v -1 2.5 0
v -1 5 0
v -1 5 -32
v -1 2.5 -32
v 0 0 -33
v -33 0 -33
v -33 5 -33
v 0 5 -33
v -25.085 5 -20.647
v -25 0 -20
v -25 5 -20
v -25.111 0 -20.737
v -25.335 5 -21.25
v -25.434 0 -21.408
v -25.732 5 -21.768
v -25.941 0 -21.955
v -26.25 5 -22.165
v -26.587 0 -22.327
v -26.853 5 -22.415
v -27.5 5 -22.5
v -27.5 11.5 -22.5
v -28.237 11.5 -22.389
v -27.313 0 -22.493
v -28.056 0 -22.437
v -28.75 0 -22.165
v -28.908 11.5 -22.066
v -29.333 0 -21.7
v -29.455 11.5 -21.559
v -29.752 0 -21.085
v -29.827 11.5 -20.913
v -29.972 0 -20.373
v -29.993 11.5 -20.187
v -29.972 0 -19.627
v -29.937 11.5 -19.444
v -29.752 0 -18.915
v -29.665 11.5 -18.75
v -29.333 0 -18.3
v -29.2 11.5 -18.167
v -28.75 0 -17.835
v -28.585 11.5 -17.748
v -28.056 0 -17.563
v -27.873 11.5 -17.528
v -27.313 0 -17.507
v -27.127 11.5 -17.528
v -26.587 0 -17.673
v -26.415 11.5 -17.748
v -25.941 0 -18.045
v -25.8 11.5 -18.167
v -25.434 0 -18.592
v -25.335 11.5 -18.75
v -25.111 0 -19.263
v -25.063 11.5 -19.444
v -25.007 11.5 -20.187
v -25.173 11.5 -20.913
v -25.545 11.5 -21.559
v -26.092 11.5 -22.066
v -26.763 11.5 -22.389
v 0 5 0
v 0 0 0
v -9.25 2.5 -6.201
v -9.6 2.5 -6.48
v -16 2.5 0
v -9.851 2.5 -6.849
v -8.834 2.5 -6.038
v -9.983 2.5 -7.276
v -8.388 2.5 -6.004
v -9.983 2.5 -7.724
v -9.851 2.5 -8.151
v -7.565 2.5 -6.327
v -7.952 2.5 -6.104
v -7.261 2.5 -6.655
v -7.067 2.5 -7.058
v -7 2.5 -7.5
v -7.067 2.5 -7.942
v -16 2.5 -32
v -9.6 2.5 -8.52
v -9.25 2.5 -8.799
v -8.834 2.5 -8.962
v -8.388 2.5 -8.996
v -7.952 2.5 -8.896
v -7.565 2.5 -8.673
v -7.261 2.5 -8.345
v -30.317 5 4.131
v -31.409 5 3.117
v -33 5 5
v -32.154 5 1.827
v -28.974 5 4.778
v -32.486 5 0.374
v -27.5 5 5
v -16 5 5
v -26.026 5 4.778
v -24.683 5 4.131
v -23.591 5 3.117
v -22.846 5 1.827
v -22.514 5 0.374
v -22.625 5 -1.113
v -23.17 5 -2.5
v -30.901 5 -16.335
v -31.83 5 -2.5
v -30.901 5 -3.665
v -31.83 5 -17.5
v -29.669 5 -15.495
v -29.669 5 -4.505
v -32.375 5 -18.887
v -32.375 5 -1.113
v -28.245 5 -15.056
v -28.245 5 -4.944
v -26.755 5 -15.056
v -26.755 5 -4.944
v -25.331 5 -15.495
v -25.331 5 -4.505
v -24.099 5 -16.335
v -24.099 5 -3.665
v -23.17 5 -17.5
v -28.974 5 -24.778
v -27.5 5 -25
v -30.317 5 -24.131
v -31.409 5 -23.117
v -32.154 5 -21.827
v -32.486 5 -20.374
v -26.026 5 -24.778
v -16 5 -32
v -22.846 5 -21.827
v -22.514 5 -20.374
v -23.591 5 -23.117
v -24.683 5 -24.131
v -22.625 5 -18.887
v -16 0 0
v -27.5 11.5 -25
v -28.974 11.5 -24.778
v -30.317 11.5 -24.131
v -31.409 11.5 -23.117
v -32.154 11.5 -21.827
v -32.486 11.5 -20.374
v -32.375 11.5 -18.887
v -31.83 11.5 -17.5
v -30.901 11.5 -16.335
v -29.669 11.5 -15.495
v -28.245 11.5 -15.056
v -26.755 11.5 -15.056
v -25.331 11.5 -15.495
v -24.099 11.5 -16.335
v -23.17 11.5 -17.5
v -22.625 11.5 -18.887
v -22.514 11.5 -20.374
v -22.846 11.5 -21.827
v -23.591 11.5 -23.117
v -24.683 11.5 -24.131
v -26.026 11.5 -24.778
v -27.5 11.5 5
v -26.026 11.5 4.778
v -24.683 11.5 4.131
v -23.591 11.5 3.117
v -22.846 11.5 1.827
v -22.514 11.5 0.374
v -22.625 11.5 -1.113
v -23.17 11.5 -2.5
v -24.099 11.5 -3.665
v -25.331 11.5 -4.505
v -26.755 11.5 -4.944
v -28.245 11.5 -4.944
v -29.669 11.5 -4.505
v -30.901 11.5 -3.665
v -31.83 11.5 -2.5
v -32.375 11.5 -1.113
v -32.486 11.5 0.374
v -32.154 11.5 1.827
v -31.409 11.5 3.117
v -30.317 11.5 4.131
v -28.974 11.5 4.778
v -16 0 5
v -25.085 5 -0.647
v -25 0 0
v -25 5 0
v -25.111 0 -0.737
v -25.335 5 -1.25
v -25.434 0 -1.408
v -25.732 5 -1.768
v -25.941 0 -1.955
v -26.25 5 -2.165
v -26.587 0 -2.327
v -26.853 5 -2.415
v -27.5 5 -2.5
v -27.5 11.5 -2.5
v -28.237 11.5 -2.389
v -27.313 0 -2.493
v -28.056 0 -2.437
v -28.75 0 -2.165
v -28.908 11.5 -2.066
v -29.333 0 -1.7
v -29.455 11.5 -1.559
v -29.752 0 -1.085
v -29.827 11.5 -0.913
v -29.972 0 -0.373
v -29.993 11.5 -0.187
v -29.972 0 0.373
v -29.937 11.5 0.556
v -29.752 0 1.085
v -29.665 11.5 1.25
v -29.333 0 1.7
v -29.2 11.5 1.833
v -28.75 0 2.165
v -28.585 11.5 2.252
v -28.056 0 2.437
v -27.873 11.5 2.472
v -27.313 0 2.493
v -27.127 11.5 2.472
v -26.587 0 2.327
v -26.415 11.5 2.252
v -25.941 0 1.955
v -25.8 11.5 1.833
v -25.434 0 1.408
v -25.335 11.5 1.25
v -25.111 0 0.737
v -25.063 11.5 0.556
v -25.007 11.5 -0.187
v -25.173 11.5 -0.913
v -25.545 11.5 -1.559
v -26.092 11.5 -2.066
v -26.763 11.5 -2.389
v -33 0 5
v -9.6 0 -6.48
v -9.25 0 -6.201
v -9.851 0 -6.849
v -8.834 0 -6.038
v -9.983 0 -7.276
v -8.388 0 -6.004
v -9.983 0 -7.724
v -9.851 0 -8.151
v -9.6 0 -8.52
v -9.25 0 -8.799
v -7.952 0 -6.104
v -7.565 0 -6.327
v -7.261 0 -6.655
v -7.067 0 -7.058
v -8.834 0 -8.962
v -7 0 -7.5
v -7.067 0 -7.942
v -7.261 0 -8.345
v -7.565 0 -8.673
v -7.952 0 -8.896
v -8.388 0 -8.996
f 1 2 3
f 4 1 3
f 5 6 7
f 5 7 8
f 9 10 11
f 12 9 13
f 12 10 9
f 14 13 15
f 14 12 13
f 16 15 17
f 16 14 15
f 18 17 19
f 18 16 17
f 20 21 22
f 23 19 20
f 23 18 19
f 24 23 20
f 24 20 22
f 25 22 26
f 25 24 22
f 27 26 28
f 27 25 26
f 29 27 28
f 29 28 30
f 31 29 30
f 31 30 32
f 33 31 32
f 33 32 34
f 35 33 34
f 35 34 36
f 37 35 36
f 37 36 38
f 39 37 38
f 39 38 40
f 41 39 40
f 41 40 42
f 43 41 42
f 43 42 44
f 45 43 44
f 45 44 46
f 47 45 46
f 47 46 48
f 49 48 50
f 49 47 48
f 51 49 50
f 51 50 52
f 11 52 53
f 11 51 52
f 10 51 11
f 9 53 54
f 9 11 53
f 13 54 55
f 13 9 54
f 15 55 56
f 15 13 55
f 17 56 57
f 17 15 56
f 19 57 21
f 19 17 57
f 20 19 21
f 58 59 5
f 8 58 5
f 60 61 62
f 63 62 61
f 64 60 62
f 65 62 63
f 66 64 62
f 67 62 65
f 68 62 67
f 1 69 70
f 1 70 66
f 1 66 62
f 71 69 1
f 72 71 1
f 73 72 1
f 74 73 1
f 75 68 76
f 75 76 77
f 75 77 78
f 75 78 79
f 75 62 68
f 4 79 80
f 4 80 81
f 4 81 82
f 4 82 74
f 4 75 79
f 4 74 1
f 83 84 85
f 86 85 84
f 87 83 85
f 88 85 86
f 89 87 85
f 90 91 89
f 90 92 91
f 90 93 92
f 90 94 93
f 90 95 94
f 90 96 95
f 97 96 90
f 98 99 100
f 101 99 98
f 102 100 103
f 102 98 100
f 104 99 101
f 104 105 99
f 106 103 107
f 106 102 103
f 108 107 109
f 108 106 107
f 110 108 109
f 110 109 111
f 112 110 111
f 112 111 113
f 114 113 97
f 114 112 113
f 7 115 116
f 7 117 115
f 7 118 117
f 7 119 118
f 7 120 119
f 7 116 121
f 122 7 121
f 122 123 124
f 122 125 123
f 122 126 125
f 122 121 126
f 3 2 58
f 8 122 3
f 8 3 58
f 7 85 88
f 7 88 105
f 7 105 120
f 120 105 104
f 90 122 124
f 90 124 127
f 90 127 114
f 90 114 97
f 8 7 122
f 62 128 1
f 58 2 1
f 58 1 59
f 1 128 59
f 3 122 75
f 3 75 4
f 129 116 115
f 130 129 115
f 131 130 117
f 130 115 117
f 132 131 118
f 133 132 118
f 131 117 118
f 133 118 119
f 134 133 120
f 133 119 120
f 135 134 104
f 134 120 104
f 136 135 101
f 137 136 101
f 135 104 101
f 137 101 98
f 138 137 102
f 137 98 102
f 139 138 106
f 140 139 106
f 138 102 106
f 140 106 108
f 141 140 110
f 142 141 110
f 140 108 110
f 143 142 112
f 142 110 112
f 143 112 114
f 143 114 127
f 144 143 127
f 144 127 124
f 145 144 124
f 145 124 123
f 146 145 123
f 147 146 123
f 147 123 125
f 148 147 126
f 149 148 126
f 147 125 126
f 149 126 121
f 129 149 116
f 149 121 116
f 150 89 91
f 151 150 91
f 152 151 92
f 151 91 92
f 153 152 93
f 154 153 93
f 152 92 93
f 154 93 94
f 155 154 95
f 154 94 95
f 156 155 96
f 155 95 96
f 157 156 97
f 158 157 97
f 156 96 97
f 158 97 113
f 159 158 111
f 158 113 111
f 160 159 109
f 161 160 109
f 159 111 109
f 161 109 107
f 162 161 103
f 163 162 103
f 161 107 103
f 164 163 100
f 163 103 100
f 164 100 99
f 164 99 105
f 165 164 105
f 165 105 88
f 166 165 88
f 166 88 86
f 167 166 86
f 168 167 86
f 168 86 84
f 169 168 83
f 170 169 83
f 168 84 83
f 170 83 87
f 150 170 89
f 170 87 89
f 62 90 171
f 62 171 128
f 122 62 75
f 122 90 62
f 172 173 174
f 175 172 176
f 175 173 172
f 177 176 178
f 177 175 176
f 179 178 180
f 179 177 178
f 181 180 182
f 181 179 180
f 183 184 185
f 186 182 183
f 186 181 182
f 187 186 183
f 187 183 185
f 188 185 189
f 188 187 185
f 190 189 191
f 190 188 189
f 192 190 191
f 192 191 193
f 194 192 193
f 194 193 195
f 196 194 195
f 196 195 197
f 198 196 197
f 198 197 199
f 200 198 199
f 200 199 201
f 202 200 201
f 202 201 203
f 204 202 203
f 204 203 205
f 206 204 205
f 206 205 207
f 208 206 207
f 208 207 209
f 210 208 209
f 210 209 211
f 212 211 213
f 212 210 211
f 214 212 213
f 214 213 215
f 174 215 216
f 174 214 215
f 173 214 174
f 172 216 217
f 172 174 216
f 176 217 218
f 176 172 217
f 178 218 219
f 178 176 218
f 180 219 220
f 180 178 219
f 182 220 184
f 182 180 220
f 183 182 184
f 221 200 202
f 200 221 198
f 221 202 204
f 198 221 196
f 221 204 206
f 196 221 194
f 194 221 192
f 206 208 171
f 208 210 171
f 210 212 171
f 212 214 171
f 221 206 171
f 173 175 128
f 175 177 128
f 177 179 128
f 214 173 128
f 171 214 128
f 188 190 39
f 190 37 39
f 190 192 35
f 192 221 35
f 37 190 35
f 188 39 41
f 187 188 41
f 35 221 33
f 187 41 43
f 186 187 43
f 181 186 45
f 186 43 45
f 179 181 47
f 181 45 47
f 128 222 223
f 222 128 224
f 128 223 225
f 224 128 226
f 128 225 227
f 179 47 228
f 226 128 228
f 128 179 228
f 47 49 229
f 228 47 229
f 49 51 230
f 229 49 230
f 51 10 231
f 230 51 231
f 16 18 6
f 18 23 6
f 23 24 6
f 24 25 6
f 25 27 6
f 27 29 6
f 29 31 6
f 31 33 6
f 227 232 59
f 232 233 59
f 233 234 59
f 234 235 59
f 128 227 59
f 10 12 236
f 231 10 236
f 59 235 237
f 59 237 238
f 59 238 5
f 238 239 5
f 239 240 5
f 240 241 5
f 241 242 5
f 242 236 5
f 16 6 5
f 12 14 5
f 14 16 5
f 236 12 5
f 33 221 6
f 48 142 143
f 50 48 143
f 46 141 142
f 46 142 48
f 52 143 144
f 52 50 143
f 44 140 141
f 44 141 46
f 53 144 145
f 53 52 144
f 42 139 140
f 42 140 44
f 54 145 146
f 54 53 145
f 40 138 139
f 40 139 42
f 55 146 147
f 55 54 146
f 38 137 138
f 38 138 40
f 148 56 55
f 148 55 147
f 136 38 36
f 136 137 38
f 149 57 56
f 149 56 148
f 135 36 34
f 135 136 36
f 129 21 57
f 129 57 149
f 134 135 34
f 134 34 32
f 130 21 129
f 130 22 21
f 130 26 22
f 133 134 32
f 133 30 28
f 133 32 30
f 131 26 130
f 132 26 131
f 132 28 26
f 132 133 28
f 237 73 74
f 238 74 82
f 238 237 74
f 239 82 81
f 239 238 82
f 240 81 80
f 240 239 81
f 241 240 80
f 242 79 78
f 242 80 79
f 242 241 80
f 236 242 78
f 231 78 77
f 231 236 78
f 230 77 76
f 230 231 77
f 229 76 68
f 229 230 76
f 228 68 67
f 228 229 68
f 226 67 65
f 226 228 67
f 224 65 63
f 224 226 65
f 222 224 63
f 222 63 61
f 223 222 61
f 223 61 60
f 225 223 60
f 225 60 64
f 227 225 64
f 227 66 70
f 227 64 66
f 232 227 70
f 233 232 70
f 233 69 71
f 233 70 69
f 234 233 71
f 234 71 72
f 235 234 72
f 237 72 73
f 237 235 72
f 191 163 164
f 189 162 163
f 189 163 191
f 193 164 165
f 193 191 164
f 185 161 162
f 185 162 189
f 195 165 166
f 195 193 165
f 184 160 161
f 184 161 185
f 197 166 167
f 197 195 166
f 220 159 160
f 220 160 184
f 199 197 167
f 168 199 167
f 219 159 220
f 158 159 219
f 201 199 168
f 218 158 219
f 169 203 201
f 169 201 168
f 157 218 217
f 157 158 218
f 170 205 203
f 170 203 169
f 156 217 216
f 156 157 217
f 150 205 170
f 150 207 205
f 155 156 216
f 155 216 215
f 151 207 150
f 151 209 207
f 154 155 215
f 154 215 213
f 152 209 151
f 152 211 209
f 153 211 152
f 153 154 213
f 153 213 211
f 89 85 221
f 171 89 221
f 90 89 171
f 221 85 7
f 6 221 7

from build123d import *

# Parameters (mm, degrees)
SKETCH1_W                = 33
SKETCH1_H                = 33
BOSS_EXTRUDE1_DEPTH      = 5
SKETCH2_W                = 15
SKETCH2_H                = 32
CUT_EXTRUDE1_DEPTH       = 2.5
SKETCH4_W                = 17
SKETCH4_H                = 5
BOSS_EXTRUDE3_DEPTH      = 5
SKETCH3_R                = 5
SKETCH3_R_2              = 2.5
BOSS_EXTRUDE4_DEPTH      = 6.5
CUT_EXTRUDE4_START       = -5
CUT_EXTRUDE4_OUTLINE_R   = 2.5
CUT_EXTRUDE4_OUTLINE_R_2 = 1.5
CUT_EXTRUDE4_DEPTH       = 5


# Read off the part's stored shape, not the designer's step: Cut-Extrude4
with BuildPart() as part:
    # Sketch1 → Boss-Extrude1 (new body)
    with BuildSketch(Plane(origin=(0, 0, 0), x_dir=(1, 0, 0), z_dir=(0, 1, 0))):
        with Locations((-16.5, 16.5)):
            Rectangle(SKETCH1_W, SKETCH1_H)
    extrude(amount=BOSS_EXTRUDE1_DEPTH)

    # Sketch2 → Cut-Extrude1 (cut)
    with BuildSketch(Plane(origin=(0, 5, 0), x_dir=(1, 0, 0), z_dir=(0, 1, 0))):
        with Locations((-8.5, 16)):
            Rectangle(SKETCH2_W, SKETCH2_H)
    extrude(amount=-CUT_EXTRUDE1_DEPTH, mode=Mode.SUBTRACT)

    # Sketch4 → Boss-Extrude3 (add)
    with BuildSketch(Plane(origin=(0, 5, 0), x_dir=(1, 0, 0), z_dir=(0, 1, 0))):
        with Locations((-24.5, -2.5)):
            Rectangle(SKETCH4_W, SKETCH4_H)
    extrude(amount=-BOSS_EXTRUDE3_DEPTH)

    # Sketch3 → Boss-Extrude4 (add)
    # profile 1 of 2: a face of its own
    with BuildSketch(Plane(origin=(0, 5, 0), x_dir=(1, 0, 0), z_dir=(0, 1, 0))):
        with Locations(Location((-27.5, 20, 0), (0, 0, 90))):
            Circle(SKETCH3_R)
        with Locations(Location((-27.5, 20, 0), (0, 0, 90))):
            Circle(SKETCH3_R_2, mode=Mode.SUBTRACT)
    # profile 2 of 2: a face of its own
    with BuildSketch(Plane(origin=(0, 5, 0), x_dir=(1, 0, 0), z_dir=(0, 1, 0))):
        with Locations(Location((-27.5, 0, 0), (0, 0, 270))):
            Circle(SKETCH3_R)
        with Locations(Location((-27.5, 0, 0), (0, 0, 90))):
            Circle(SKETCH3_R_2, mode=Mode.SUBTRACT)
    extrude(amount=BOSS_EXTRUDE4_DEPTH)

    # Cut-Extrude4 outline → Cut-Extrude4 (cut)
    with BuildSketch(Plane(origin=(0, 5, 0), x_dir=(1, 0, 0), z_dir=(0, 1, 0)).offset(CUT_EXTRUDE4_START)):
        with Locations((-27.5, 20)):
            Circle(CUT_EXTRUDE4_OUTLINE_R)
        with Locations((-27.5, 0)):
            Circle(CUT_EXTRUDE4_OUTLINE_R)
        with Locations((-8.5, 7.5)):
            Circle(CUT_EXTRUDE4_OUTLINE_R_2)
    extrude(amount=CUT_EXTRUDE4_DEPTH, mode=Mode.SUBTRACT)


solid = part.part
